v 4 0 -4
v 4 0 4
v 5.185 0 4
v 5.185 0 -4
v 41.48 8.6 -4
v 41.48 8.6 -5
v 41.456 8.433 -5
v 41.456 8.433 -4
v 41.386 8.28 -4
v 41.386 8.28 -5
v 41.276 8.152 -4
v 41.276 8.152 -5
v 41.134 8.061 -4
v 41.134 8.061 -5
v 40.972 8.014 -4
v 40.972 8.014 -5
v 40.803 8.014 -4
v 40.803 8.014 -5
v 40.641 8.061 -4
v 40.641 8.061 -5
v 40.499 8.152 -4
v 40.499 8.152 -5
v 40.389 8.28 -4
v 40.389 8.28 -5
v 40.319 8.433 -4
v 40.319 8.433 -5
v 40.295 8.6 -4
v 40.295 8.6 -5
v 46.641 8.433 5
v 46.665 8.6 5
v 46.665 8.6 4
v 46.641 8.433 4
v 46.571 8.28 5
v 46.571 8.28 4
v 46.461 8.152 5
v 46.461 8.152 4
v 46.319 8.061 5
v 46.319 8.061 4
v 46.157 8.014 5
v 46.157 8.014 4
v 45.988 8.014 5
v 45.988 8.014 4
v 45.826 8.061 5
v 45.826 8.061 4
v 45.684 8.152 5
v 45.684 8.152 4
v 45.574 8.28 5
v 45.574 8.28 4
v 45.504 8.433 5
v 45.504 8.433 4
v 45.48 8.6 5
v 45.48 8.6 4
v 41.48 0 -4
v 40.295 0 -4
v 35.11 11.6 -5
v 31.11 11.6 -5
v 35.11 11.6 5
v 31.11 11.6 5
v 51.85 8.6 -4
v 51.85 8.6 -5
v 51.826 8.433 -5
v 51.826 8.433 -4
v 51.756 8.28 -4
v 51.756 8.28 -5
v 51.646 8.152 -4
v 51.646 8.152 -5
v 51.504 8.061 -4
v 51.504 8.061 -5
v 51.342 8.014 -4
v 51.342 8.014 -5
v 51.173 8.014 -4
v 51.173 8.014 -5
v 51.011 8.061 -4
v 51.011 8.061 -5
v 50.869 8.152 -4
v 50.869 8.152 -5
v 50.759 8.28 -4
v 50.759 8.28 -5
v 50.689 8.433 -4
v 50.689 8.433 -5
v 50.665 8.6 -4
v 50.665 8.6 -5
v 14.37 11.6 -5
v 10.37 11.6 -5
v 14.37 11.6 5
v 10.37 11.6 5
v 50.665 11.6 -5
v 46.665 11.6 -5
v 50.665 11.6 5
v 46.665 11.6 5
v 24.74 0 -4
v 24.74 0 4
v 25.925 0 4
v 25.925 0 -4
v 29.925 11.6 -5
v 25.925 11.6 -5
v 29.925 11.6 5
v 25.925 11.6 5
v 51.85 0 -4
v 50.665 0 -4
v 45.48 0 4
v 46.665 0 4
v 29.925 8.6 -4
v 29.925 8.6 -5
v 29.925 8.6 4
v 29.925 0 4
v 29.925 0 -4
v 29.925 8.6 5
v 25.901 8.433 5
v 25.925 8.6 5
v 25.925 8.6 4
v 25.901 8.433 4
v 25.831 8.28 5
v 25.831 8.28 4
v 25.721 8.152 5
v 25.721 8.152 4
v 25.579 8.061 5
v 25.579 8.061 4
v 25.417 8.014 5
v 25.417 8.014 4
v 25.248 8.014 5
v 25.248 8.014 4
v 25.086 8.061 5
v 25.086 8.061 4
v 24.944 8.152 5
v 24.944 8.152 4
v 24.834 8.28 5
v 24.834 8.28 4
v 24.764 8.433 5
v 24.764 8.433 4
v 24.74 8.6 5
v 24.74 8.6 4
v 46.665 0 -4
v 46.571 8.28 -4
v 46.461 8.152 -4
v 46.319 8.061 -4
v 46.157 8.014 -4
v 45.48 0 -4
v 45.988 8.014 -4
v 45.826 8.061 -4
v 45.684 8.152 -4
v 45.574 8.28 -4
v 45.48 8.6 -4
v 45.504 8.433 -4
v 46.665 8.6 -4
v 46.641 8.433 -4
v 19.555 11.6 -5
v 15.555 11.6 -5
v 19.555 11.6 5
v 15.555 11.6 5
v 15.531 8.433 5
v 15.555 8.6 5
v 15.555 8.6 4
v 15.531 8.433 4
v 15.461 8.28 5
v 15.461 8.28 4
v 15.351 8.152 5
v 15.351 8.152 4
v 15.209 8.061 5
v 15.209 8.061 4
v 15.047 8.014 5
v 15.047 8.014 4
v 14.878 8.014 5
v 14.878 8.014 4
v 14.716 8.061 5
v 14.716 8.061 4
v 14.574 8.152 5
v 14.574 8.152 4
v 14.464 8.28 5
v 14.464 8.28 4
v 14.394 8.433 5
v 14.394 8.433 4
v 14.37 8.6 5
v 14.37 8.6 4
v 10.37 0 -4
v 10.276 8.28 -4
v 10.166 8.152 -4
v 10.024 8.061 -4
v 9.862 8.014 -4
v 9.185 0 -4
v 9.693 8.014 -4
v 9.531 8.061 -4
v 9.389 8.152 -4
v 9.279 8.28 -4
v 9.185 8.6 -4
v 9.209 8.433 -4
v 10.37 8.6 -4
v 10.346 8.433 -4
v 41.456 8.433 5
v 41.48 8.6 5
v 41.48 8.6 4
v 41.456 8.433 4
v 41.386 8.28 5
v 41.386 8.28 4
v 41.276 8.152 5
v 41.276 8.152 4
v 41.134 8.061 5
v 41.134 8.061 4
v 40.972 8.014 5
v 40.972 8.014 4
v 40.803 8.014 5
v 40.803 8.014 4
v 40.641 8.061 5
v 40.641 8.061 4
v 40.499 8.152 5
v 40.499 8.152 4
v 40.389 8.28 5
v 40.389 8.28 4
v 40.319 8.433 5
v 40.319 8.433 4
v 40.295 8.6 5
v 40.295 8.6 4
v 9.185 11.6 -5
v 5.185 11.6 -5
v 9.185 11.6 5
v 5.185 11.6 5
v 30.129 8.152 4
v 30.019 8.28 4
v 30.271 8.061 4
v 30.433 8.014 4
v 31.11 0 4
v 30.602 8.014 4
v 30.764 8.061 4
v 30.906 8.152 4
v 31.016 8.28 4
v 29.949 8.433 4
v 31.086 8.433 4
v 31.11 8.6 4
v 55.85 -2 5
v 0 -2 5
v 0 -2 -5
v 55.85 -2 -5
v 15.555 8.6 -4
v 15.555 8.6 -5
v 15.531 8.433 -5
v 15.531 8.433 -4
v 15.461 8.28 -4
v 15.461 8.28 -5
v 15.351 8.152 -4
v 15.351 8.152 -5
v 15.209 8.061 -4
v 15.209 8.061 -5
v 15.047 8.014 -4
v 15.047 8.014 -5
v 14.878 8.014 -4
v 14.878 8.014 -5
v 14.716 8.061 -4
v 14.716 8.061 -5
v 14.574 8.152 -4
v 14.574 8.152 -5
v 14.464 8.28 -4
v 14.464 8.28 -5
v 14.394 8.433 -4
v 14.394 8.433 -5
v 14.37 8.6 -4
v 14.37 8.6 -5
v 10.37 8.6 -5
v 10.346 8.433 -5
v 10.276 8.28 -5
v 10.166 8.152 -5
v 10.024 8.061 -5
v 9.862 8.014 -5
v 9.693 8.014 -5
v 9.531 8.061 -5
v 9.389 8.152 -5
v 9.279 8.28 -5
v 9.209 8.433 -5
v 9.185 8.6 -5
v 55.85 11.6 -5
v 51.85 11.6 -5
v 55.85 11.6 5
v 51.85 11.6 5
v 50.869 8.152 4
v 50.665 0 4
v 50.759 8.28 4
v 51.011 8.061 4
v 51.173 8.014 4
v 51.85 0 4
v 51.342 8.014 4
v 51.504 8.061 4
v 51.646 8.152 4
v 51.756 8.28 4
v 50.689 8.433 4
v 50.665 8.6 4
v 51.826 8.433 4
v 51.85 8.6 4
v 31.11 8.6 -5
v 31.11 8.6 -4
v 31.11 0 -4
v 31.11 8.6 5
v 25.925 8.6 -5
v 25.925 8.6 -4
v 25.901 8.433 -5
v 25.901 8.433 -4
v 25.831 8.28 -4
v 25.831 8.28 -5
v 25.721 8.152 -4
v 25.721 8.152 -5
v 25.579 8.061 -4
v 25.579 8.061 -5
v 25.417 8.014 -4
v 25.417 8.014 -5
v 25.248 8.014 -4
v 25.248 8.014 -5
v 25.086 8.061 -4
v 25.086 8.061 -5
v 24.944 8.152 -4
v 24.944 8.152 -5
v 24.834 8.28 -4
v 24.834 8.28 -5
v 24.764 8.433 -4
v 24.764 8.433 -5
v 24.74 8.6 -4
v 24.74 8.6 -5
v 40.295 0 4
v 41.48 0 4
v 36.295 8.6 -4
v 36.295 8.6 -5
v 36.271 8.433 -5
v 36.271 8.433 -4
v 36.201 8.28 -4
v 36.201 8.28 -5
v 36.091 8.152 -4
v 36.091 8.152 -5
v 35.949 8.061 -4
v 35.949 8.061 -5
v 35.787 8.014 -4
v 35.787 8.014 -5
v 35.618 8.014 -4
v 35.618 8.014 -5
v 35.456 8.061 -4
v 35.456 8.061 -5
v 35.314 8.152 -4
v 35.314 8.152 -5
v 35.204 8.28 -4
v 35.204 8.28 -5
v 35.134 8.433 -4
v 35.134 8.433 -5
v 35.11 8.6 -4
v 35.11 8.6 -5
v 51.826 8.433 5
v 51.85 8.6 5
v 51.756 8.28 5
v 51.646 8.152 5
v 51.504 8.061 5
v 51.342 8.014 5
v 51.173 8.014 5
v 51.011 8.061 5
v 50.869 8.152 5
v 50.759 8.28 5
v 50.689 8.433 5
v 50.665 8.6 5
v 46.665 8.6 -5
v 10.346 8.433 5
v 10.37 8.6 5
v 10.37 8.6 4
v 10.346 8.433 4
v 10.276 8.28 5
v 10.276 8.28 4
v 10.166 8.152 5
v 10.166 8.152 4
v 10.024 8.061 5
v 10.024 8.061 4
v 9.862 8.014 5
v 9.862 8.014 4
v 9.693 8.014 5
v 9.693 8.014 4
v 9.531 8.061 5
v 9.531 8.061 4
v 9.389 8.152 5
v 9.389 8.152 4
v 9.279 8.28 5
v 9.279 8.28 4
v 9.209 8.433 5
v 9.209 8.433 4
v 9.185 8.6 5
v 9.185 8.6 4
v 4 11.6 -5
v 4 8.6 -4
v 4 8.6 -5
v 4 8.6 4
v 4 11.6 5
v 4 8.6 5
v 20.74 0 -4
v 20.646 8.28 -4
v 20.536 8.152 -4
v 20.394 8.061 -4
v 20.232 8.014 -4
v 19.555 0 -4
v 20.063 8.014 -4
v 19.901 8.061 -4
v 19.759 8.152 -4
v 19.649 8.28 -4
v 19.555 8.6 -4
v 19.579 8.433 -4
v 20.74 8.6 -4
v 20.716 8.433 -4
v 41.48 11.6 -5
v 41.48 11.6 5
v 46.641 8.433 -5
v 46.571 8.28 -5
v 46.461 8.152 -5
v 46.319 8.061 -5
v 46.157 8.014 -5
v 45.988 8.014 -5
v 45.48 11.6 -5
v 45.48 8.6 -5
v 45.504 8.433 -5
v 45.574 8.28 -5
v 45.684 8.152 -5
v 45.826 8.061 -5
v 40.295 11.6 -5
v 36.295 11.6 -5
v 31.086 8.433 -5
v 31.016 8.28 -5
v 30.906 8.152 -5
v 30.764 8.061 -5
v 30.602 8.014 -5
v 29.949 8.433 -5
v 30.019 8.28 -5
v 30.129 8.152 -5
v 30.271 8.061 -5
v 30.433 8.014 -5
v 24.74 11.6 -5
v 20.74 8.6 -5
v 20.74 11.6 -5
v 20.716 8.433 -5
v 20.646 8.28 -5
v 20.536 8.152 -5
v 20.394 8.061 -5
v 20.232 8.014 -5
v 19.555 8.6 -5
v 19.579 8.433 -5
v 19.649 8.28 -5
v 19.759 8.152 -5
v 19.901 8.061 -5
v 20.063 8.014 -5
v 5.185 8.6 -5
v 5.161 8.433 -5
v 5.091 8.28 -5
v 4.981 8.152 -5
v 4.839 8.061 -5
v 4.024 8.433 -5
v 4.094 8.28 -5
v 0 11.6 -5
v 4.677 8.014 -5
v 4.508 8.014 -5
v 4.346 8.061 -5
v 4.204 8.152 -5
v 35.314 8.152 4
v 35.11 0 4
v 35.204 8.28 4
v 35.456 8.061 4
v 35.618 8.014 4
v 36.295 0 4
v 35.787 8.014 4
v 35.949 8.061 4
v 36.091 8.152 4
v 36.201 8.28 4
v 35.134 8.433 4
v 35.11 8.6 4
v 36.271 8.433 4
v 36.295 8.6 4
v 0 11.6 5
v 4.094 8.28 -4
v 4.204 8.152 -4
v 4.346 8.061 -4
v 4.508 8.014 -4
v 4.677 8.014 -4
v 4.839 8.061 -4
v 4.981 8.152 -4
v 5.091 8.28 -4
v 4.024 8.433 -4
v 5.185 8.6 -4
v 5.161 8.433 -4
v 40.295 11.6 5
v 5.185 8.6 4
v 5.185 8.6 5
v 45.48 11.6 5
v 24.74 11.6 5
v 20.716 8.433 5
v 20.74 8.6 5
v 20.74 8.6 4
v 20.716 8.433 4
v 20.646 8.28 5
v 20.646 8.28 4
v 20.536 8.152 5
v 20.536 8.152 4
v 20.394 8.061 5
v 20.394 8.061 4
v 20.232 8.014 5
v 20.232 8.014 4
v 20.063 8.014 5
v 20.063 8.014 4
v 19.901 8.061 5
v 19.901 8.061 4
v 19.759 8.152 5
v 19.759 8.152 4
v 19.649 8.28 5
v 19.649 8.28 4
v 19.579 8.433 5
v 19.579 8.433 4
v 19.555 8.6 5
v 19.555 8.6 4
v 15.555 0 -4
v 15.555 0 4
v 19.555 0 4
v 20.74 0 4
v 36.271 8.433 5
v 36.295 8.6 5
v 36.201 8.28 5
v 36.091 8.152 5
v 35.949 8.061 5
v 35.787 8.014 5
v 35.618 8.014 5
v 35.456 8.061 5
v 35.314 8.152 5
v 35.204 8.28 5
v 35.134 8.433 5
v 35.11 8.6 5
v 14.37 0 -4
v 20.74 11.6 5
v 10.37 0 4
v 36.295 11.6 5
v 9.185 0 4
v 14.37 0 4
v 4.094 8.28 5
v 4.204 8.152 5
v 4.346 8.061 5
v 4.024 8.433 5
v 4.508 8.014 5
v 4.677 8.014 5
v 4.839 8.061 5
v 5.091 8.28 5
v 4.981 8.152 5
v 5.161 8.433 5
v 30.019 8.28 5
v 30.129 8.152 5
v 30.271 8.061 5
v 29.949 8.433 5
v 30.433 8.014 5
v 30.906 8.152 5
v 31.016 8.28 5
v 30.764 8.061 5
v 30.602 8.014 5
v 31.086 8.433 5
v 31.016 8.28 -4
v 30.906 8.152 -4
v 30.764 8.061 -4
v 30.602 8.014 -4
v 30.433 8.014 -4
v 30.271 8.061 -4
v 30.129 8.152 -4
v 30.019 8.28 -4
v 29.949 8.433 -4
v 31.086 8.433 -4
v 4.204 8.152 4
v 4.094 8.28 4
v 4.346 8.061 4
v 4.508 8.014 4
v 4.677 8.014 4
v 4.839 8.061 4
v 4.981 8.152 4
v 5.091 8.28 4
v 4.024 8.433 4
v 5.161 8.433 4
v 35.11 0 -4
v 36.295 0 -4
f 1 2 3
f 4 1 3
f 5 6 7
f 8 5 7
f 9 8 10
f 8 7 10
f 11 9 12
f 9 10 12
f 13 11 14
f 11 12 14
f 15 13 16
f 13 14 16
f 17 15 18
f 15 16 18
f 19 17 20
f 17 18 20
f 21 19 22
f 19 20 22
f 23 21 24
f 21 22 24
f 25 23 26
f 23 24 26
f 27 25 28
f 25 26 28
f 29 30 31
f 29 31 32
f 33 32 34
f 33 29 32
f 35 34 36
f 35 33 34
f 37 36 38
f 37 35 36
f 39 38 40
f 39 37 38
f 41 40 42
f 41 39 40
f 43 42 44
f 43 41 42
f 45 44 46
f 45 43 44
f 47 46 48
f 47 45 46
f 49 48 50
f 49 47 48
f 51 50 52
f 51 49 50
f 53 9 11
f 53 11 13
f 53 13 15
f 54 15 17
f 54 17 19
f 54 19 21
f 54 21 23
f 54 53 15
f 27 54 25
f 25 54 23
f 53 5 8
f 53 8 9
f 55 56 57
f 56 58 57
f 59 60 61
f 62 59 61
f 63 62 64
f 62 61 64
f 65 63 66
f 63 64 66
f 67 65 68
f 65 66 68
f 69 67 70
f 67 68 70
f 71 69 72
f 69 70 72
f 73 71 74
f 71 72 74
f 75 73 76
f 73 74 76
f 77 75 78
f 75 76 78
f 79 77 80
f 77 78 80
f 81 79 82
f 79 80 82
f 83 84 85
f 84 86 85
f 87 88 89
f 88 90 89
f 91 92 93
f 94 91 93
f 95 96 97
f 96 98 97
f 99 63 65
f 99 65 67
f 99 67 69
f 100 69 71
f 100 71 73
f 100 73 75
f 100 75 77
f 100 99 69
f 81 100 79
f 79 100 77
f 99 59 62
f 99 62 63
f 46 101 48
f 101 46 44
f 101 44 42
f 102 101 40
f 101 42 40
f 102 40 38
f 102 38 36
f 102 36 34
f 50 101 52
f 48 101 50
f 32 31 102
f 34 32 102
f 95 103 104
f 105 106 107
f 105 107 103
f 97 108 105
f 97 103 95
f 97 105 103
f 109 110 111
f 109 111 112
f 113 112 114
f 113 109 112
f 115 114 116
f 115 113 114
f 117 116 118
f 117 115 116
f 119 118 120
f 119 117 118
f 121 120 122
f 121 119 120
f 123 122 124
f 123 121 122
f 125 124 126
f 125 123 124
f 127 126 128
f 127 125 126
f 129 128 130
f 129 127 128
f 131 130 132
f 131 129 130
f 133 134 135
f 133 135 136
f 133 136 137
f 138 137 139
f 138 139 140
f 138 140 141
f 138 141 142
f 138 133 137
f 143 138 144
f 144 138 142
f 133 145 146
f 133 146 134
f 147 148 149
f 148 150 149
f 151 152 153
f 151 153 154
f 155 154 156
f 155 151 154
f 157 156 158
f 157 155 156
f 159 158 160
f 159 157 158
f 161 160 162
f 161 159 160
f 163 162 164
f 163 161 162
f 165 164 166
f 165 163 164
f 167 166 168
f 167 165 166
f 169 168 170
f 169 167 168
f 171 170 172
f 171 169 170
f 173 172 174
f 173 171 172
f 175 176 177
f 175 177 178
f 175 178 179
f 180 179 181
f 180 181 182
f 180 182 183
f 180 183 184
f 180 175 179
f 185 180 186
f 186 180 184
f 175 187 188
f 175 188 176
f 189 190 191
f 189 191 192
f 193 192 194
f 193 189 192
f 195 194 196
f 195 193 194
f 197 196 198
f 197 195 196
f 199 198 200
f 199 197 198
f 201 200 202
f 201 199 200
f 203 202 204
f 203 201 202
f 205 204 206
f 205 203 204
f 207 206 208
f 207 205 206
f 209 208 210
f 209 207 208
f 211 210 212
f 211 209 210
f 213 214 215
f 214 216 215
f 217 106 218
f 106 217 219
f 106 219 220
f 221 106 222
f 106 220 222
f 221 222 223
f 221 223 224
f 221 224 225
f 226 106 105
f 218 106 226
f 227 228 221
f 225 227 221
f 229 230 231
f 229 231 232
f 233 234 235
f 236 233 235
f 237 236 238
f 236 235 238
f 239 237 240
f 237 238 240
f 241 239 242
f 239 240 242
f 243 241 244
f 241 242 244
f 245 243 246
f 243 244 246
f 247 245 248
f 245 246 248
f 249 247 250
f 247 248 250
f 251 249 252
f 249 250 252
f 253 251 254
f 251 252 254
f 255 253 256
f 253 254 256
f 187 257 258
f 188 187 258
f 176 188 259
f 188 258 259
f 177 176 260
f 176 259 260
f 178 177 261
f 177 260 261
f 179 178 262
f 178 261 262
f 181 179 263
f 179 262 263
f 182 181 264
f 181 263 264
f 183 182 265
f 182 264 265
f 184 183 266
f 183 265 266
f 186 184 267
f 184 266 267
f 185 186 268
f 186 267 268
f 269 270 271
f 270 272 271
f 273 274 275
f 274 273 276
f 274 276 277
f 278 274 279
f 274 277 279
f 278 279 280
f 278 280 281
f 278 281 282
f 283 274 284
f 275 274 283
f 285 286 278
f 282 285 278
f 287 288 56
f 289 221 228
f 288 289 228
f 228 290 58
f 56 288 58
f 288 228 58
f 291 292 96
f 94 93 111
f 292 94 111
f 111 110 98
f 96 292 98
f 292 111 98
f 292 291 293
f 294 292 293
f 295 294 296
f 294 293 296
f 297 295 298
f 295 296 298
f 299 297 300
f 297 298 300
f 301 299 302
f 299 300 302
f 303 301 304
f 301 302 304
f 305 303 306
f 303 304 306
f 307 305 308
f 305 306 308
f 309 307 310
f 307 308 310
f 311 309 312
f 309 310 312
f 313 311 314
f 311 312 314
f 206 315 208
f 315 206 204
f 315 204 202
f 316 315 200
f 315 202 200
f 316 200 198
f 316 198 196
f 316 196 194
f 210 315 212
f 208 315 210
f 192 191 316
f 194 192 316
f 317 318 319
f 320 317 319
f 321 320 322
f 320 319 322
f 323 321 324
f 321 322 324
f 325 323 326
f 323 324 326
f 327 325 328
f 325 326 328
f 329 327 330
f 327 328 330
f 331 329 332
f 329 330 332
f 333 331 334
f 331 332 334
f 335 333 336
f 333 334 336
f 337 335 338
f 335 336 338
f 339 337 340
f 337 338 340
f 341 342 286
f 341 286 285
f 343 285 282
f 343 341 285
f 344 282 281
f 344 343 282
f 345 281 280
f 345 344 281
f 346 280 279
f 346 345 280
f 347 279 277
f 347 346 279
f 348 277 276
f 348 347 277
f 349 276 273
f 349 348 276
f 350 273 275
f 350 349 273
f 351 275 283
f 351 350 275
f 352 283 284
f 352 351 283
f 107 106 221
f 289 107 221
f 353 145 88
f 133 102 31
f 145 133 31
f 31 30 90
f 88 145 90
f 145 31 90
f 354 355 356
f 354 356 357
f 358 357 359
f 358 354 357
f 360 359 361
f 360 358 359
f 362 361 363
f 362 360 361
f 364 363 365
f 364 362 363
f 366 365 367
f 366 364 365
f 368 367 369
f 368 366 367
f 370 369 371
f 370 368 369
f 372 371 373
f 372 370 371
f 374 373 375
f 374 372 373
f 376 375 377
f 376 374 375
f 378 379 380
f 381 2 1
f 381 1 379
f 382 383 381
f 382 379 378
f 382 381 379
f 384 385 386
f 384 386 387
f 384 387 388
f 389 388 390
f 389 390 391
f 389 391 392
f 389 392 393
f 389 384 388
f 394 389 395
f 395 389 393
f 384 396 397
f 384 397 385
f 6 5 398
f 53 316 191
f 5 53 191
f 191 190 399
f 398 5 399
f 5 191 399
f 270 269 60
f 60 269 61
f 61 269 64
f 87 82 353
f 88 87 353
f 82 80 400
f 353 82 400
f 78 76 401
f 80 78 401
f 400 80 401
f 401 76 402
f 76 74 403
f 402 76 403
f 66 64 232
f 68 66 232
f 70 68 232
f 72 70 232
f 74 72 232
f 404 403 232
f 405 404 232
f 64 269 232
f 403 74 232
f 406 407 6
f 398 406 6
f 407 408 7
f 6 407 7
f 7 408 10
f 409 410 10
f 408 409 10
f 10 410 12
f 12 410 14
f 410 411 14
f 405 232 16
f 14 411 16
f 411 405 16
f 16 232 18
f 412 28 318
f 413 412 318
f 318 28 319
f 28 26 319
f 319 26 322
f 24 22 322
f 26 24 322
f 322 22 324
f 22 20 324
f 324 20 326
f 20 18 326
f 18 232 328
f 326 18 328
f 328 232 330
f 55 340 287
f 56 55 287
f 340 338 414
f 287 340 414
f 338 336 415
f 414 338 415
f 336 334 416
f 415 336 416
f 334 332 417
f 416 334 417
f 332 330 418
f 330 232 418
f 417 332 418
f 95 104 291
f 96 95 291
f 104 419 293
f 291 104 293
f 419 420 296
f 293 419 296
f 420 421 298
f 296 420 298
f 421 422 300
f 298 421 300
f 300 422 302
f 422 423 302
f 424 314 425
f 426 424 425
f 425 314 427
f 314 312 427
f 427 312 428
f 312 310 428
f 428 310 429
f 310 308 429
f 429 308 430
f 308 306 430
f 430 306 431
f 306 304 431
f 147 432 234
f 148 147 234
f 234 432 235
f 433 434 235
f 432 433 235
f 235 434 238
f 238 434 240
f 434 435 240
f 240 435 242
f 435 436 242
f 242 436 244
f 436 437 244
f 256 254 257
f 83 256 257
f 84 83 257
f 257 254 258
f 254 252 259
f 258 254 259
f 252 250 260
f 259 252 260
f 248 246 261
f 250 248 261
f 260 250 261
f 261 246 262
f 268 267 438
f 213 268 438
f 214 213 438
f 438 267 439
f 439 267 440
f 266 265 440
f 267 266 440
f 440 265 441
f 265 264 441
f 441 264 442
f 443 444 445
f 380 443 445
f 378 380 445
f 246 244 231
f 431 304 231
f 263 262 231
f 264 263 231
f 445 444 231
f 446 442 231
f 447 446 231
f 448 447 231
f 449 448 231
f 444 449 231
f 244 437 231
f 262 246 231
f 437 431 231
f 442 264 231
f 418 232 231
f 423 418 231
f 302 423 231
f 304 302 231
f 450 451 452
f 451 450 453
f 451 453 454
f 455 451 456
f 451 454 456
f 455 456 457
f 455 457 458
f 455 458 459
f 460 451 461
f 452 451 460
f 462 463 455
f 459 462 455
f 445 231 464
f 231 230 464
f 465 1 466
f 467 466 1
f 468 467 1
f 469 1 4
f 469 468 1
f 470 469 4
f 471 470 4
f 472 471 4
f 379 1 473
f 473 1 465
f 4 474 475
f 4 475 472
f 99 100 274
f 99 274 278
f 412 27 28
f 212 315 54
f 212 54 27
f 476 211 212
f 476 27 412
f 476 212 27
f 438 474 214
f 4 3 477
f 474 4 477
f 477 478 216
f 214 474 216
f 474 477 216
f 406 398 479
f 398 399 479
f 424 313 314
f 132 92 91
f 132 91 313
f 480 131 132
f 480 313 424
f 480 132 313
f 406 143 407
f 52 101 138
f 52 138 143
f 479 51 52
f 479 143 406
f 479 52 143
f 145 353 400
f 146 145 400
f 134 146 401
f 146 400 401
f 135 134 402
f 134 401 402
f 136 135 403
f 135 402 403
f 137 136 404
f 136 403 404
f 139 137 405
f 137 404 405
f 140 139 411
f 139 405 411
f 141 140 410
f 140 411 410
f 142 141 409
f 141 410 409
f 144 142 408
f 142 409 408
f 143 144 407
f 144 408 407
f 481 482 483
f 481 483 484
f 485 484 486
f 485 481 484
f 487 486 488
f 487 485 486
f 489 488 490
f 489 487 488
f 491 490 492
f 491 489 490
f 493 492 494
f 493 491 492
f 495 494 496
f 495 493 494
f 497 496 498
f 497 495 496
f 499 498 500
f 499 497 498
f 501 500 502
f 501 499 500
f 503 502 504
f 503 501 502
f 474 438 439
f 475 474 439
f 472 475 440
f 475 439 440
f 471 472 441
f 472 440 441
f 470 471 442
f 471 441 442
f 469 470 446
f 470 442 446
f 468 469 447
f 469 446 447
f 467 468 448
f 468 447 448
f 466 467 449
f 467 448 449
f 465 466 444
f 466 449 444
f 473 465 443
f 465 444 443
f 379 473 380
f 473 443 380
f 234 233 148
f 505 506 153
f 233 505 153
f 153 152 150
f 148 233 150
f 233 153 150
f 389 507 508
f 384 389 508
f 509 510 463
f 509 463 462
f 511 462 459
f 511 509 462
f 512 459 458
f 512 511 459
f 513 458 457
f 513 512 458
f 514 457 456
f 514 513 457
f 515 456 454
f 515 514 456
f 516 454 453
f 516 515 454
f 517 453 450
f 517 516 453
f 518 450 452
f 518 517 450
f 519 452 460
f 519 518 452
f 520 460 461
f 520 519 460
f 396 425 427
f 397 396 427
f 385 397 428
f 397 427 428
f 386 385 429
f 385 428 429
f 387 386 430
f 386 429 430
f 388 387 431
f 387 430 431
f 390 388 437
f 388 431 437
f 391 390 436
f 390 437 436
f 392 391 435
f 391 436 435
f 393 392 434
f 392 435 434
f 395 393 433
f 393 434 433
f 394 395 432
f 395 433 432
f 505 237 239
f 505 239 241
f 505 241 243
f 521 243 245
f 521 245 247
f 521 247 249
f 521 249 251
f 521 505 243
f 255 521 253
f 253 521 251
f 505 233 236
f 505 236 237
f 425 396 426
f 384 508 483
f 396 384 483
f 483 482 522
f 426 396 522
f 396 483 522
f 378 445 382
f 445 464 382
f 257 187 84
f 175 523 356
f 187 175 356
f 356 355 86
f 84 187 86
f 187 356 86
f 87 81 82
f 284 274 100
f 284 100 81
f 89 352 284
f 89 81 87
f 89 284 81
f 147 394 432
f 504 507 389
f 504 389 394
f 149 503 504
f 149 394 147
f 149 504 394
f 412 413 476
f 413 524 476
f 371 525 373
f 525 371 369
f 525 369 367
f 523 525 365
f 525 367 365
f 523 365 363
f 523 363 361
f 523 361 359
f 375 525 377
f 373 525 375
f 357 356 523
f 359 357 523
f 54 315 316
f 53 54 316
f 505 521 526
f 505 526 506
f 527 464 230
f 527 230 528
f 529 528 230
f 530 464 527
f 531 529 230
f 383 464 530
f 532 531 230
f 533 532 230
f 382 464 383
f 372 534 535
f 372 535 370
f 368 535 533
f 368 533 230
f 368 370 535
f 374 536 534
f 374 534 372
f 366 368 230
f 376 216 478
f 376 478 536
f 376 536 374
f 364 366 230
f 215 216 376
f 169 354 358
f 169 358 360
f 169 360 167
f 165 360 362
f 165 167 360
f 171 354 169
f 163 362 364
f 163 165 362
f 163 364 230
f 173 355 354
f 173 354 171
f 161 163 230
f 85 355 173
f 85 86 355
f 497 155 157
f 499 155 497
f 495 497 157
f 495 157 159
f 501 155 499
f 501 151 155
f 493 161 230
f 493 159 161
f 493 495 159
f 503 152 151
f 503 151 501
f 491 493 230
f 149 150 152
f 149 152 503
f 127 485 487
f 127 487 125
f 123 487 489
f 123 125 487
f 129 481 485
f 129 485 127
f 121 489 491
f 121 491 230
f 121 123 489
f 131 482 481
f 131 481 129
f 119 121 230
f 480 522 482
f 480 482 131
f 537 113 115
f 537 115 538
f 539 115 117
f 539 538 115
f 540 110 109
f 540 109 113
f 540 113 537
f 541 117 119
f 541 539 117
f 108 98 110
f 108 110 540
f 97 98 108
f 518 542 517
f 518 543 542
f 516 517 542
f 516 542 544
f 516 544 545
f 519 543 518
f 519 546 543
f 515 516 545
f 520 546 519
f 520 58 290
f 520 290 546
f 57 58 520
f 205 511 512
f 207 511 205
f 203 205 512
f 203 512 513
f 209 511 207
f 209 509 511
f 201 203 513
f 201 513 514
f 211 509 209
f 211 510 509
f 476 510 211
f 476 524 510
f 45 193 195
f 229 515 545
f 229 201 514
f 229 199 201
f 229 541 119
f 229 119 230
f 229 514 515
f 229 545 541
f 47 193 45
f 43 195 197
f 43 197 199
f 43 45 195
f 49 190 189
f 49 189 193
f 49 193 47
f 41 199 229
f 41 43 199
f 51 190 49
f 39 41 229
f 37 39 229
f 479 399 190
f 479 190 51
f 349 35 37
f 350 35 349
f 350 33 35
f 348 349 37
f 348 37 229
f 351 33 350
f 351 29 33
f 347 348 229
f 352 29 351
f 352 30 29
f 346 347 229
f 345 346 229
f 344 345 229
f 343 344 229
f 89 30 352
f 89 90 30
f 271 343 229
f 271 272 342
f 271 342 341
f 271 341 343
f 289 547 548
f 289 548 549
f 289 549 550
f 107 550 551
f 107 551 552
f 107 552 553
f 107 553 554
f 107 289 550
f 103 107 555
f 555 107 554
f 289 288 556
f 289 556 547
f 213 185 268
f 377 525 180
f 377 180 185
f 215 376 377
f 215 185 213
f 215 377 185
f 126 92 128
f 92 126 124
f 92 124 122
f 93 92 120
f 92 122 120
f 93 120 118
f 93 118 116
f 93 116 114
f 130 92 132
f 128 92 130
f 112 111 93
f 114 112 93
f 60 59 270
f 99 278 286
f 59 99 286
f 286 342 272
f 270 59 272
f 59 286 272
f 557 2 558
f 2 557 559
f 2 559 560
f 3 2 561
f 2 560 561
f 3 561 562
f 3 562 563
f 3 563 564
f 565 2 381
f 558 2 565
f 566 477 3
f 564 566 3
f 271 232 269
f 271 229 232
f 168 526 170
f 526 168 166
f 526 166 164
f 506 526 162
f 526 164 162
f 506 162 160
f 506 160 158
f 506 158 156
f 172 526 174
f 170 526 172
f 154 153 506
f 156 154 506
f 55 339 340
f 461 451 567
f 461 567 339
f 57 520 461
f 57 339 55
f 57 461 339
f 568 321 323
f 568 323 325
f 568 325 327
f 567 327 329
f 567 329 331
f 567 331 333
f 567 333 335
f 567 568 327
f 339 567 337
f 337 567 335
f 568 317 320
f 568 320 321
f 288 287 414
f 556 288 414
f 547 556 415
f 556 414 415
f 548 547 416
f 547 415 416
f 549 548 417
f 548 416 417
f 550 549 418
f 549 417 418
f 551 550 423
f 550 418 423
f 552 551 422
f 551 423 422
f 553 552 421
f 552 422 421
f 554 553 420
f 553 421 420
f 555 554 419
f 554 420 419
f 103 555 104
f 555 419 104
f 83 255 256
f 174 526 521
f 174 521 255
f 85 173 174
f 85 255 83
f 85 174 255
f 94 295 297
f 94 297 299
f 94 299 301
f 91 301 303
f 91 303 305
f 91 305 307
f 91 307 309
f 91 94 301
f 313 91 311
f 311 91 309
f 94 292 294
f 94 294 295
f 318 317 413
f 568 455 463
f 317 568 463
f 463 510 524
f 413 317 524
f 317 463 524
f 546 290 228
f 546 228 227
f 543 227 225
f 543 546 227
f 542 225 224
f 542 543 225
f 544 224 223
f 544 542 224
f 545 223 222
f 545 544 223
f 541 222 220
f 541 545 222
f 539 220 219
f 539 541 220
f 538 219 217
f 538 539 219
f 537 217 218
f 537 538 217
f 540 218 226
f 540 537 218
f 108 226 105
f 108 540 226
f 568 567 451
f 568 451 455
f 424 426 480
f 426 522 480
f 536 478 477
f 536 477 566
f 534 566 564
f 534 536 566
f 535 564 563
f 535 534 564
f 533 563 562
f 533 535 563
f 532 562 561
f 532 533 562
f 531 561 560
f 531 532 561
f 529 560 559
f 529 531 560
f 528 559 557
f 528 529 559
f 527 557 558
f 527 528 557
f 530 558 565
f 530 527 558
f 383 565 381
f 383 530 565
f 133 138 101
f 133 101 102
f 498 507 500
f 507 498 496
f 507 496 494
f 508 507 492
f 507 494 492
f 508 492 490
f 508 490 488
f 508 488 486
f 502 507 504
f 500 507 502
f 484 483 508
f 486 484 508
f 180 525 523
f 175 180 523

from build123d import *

# Parameters (mm, degrees)
SKIZZE1_W                       = 55.85
SKIZZE1_H                       = 2
AUFSATZ_LINEAR_AUSTRAGEN1_DEPTH = 5
SKIZZE2_W                       = 4
SKIZZE2_H                       = 11.6
AUFSATZ_LINEAR_AUSTRAGEN2_DEPTH = 5
LINEARES_MUSTER1_COUNT          = 11
LINEARES_MUSTER1_PITCH          = 5.185
AUFSATZ_LINEAR_AUSTRAGEN3_DEPTH = 1
LINEARES_MUSTER2_COUNT          = 10
LINEARES_MUSTER2_PITCH          = 5.185
LINEARES_MUSTER2_COPY_1_DEPTH   = 1
LINEARES_MUSTER2_COPY_2_DEPTH   = 1
LINEARES_MUSTER2_COPY_3_DEPTH   = 1
LINEARES_MUSTER2_COPY_4_DEPTH   = 1
LINEARES_MUSTER2_COPY_5_DEPTH   = 1
LINEARES_MUSTER2_COPY_6_DEPTH   = 1
LINEARES_MUSTER2_COPY_7_DEPTH   = 1
LINEARES_MUSTER2_COPY_8_DEPTH   = 1
LINEARES_MUSTER2_COPY_9_DEPTH   = 1


with BuildPart() as part:
    # Skizze1 → Aufsatz-Linear austragen1 (new, symmetric)
    with BuildSketch(Plane.XY):
        with Locations((27.925, -1)):
            Rectangle(SKIZZE1_W, SKIZZE1_H)
    extrude(amount=AUFSATZ_LINEAR_AUSTRAGEN1_DEPTH, both=True)

    # Skizze2 → Aufsatz-Linear austragen2 (add, symmetric)
    with BuildSketch(Plane.XY):
        with Locations((2, 5.8)):
            Rectangle(SKIZZE2_W, SKIZZE2_H)
    aufsatz_linear_austragen2 = extrude(amount=AUFSATZ_LINEAR_AUSTRAGEN2_DEPTH, both=True)

    # Lineares Muster1: Aufsatz-Linear austragen2 ×11
    with Locations(*[(i * LINEARES_MUSTER1_PITCH, 0, 0) for i in range(1, LINEARES_MUSTER1_COUNT)]):
        add(aufsatz_linear_austragen2)

    # Skizze3 → Aufsatz-Linear austragen3 (add)
    with BuildSketch(Plane.XY.offset(5)):
        with BuildLine():
            Line((4, 8.6), (4, 0))
            Line((4, 0), (5.185, 0))
            Line((5.185, 0), (5.185, 8.6))
            ThreePointArc((5.185, 8.6), (4.5925, 8.0075), (4, 8.6))
        make_face()
    aufsatz_linear_austragen3 = extrude(amount=-AUFSATZ_LINEAR_AUSTRAGEN3_DEPTH)

    # Spiegeln1: Aufsatz-Linear austragen3 across plane
    add(aufsatz_linear_austragen3.mirror(Plane.XY))

    # Lineares Muster2: Aufsatz-Linear austragen3 ×10
    with Locations(*[(i * LINEARES_MUSTER2_PITCH, 0, 0) for i in range(1, LINEARES_MUSTER2_COUNT)]):
        add(aufsatz_linear_austragen3)

    # Lineares Muster2 copy 1 sketch → Lineares Muster2 copy 1 (add)
    with BuildSketch(Plane(origin=(5.185, 0, -5), x_dir=(1, 0, 0), z_dir=(0, 0, -1))):
        with BuildLine():
            Line((4, -8.6), (4, 0))
            Line((4, 0), (5.185, 0))
            Line((5.185, 0), (5.185, -8.6))
            ThreePointArc((5.185, -8.6), (4.5925, -8.0075), (4, -8.6))
        make_face()
    extrude(amount=-LINEARES_MUSTER2_COPY_1_DEPTH)

    # Lineares Muster2 copy 2 sketch → Lineares Muster2 copy 2 (add)
    with BuildSketch(Plane(origin=(10.37, 0, -5), x_dir=(1, 0, 0), z_dir=(0, 0, -1))):
        with BuildLine():
            Line((4, -8.6), (4, 0))
            Line((4, 0), (5.185, 0))
            Line((5.185, 0), (5.185, -8.6))
            ThreePointArc((5.185, -8.6), (4.5925, -8.0075), (4, -8.6))
        make_face()
    extrude(amount=-LINEARES_MUSTER2_COPY_2_DEPTH)

    # Lineares Muster2 copy 3 sketch → Lineares Muster2 copy 3 (add)
    with BuildSketch(Plane(origin=(15.555, 0, -5), x_dir=(1, 0, 0), z_dir=(0, 0, -1))):
        with BuildLine():
            Line((4, -8.6), (4, 0))
            Line((4, 0), (5.185, 0))
            Line((5.185, 0), (5.185, -8.6))
            ThreePointArc((5.185, -8.6), (4.5925, -8.0075), (4, -8.6))
        make_face()
    extrude(amount=-LINEARES_MUSTER2_COPY_3_DEPTH)

    # Lineares Muster2 copy 4 sketch → Lineares Muster2 copy 4 (add)
    with BuildSketch(Plane(origin=(20.74, 0, -5), x_dir=(1, 0, 0), z_dir=(0, 0, -1))):
        with BuildLine():
            Line((4, -8.6), (4, 0))
            Line((4, 0), (5.185, 0))
            Line((5.185, 0), (5.185, -8.6))
            ThreePointArc((5.185, -8.6), (4.5925, -8.0075), (4, -8.6))
        make_face()
    extrude(amount=-LINEARES_MUSTER2_COPY_4_DEPTH)

    # Lineares Muster2 copy 5 sketch → Lineares Muster2 copy 5 (add)
    with BuildSketch(Plane(origin=(25.925, 0, -5), x_dir=(1, 0, 0), z_dir=(0, 0, -1))):
        with BuildLine():
            Line((4, -8.6), (4, 0))
            Line((4, 0), (5.185, 0))
            Line((5.185, 0), (5.185, -8.6))
            ThreePointArc((5.185, -8.6), (4.5925, -8.0075), (4, -8.6))
        make_face()
    extrude(amount=-LINEARES_MUSTER2_COPY_5_DEPTH)

    # Lineares Muster2 copy 6 sketch → Lineares Muster2 copy 6 (add)
    with BuildSketch(Plane(origin=(31.11, 0, -5), x_dir=(1, 0, 0), z_dir=(0, 0, -1))):
        with BuildLine():
            Line((4, -8.6), (4, 0))
            Line((4, 0), (5.185, 0))
            Line((5.185, 0), (5.185, -8.6))
            ThreePointArc((5.185, -8.6), (4.5925, -8.0075), (4, -8.6))
        make_face()
    extrude(amount=-LINEARES_MUSTER2_COPY_6_DEPTH)

    # Lineares Muster2 copy 7 sketch → Lineares Muster2 copy 7 (add)
    with BuildSketch(Plane(origin=(36.295, 0, -5), x_dir=(1, 0, 0), z_dir=(0, 0, -1))):
        with BuildLine():
            Line((4, -8.6), (4, 0))
            Line((4, 0), (5.185, 0))
            Line((5.185, 0), (5.185, -8.6))
            ThreePointArc((5.185, -8.6), (4.5925, -8.0075), (4, -8.6))
        make_face()
    extrude(amount=-LINEARES_MUSTER2_COPY_7_DEPTH)

    # Lineares Muster2 copy 8 sketch → Lineares Muster2 copy 8 (add)
    with BuildSketch(Plane(origin=(41.48, 0, -5), x_dir=(1, 0, 0), z_dir=(0, 0, -1))):
        with BuildLine():
            Line((4, -8.6), (4, 0))
            Line((4, 0), (5.185, 0))
            Line((5.185, 0), (5.185, -8.6))
            ThreePointArc((5.185, -8.6), (4.5925, -8.0075), (4, -8.6))
        make_face()
    extrude(amount=-LINEARES_MUSTER2_COPY_8_DEPTH)

    # Lineares Muster2 copy 9 sketch → Lineares Muster2 copy 9 (add)
    with BuildSketch(Plane(origin=(46.665, 0, -5), x_dir=(1, 0, 0), z_dir=(0, 0, -1))):
        with BuildLine():
            Line((4, -8.6), (4, 0))
            Line((4, 0), (5.185, 0))
            Line((5.185, 0), (5.185, -8.6))
            ThreePointArc((5.185, -8.6), (4.5925, -8.0075), (4, -8.6))
        make_face()
    extrude(amount=-LINEARES_MUSTER2_COPY_9_DEPTH)


solid = part.part
